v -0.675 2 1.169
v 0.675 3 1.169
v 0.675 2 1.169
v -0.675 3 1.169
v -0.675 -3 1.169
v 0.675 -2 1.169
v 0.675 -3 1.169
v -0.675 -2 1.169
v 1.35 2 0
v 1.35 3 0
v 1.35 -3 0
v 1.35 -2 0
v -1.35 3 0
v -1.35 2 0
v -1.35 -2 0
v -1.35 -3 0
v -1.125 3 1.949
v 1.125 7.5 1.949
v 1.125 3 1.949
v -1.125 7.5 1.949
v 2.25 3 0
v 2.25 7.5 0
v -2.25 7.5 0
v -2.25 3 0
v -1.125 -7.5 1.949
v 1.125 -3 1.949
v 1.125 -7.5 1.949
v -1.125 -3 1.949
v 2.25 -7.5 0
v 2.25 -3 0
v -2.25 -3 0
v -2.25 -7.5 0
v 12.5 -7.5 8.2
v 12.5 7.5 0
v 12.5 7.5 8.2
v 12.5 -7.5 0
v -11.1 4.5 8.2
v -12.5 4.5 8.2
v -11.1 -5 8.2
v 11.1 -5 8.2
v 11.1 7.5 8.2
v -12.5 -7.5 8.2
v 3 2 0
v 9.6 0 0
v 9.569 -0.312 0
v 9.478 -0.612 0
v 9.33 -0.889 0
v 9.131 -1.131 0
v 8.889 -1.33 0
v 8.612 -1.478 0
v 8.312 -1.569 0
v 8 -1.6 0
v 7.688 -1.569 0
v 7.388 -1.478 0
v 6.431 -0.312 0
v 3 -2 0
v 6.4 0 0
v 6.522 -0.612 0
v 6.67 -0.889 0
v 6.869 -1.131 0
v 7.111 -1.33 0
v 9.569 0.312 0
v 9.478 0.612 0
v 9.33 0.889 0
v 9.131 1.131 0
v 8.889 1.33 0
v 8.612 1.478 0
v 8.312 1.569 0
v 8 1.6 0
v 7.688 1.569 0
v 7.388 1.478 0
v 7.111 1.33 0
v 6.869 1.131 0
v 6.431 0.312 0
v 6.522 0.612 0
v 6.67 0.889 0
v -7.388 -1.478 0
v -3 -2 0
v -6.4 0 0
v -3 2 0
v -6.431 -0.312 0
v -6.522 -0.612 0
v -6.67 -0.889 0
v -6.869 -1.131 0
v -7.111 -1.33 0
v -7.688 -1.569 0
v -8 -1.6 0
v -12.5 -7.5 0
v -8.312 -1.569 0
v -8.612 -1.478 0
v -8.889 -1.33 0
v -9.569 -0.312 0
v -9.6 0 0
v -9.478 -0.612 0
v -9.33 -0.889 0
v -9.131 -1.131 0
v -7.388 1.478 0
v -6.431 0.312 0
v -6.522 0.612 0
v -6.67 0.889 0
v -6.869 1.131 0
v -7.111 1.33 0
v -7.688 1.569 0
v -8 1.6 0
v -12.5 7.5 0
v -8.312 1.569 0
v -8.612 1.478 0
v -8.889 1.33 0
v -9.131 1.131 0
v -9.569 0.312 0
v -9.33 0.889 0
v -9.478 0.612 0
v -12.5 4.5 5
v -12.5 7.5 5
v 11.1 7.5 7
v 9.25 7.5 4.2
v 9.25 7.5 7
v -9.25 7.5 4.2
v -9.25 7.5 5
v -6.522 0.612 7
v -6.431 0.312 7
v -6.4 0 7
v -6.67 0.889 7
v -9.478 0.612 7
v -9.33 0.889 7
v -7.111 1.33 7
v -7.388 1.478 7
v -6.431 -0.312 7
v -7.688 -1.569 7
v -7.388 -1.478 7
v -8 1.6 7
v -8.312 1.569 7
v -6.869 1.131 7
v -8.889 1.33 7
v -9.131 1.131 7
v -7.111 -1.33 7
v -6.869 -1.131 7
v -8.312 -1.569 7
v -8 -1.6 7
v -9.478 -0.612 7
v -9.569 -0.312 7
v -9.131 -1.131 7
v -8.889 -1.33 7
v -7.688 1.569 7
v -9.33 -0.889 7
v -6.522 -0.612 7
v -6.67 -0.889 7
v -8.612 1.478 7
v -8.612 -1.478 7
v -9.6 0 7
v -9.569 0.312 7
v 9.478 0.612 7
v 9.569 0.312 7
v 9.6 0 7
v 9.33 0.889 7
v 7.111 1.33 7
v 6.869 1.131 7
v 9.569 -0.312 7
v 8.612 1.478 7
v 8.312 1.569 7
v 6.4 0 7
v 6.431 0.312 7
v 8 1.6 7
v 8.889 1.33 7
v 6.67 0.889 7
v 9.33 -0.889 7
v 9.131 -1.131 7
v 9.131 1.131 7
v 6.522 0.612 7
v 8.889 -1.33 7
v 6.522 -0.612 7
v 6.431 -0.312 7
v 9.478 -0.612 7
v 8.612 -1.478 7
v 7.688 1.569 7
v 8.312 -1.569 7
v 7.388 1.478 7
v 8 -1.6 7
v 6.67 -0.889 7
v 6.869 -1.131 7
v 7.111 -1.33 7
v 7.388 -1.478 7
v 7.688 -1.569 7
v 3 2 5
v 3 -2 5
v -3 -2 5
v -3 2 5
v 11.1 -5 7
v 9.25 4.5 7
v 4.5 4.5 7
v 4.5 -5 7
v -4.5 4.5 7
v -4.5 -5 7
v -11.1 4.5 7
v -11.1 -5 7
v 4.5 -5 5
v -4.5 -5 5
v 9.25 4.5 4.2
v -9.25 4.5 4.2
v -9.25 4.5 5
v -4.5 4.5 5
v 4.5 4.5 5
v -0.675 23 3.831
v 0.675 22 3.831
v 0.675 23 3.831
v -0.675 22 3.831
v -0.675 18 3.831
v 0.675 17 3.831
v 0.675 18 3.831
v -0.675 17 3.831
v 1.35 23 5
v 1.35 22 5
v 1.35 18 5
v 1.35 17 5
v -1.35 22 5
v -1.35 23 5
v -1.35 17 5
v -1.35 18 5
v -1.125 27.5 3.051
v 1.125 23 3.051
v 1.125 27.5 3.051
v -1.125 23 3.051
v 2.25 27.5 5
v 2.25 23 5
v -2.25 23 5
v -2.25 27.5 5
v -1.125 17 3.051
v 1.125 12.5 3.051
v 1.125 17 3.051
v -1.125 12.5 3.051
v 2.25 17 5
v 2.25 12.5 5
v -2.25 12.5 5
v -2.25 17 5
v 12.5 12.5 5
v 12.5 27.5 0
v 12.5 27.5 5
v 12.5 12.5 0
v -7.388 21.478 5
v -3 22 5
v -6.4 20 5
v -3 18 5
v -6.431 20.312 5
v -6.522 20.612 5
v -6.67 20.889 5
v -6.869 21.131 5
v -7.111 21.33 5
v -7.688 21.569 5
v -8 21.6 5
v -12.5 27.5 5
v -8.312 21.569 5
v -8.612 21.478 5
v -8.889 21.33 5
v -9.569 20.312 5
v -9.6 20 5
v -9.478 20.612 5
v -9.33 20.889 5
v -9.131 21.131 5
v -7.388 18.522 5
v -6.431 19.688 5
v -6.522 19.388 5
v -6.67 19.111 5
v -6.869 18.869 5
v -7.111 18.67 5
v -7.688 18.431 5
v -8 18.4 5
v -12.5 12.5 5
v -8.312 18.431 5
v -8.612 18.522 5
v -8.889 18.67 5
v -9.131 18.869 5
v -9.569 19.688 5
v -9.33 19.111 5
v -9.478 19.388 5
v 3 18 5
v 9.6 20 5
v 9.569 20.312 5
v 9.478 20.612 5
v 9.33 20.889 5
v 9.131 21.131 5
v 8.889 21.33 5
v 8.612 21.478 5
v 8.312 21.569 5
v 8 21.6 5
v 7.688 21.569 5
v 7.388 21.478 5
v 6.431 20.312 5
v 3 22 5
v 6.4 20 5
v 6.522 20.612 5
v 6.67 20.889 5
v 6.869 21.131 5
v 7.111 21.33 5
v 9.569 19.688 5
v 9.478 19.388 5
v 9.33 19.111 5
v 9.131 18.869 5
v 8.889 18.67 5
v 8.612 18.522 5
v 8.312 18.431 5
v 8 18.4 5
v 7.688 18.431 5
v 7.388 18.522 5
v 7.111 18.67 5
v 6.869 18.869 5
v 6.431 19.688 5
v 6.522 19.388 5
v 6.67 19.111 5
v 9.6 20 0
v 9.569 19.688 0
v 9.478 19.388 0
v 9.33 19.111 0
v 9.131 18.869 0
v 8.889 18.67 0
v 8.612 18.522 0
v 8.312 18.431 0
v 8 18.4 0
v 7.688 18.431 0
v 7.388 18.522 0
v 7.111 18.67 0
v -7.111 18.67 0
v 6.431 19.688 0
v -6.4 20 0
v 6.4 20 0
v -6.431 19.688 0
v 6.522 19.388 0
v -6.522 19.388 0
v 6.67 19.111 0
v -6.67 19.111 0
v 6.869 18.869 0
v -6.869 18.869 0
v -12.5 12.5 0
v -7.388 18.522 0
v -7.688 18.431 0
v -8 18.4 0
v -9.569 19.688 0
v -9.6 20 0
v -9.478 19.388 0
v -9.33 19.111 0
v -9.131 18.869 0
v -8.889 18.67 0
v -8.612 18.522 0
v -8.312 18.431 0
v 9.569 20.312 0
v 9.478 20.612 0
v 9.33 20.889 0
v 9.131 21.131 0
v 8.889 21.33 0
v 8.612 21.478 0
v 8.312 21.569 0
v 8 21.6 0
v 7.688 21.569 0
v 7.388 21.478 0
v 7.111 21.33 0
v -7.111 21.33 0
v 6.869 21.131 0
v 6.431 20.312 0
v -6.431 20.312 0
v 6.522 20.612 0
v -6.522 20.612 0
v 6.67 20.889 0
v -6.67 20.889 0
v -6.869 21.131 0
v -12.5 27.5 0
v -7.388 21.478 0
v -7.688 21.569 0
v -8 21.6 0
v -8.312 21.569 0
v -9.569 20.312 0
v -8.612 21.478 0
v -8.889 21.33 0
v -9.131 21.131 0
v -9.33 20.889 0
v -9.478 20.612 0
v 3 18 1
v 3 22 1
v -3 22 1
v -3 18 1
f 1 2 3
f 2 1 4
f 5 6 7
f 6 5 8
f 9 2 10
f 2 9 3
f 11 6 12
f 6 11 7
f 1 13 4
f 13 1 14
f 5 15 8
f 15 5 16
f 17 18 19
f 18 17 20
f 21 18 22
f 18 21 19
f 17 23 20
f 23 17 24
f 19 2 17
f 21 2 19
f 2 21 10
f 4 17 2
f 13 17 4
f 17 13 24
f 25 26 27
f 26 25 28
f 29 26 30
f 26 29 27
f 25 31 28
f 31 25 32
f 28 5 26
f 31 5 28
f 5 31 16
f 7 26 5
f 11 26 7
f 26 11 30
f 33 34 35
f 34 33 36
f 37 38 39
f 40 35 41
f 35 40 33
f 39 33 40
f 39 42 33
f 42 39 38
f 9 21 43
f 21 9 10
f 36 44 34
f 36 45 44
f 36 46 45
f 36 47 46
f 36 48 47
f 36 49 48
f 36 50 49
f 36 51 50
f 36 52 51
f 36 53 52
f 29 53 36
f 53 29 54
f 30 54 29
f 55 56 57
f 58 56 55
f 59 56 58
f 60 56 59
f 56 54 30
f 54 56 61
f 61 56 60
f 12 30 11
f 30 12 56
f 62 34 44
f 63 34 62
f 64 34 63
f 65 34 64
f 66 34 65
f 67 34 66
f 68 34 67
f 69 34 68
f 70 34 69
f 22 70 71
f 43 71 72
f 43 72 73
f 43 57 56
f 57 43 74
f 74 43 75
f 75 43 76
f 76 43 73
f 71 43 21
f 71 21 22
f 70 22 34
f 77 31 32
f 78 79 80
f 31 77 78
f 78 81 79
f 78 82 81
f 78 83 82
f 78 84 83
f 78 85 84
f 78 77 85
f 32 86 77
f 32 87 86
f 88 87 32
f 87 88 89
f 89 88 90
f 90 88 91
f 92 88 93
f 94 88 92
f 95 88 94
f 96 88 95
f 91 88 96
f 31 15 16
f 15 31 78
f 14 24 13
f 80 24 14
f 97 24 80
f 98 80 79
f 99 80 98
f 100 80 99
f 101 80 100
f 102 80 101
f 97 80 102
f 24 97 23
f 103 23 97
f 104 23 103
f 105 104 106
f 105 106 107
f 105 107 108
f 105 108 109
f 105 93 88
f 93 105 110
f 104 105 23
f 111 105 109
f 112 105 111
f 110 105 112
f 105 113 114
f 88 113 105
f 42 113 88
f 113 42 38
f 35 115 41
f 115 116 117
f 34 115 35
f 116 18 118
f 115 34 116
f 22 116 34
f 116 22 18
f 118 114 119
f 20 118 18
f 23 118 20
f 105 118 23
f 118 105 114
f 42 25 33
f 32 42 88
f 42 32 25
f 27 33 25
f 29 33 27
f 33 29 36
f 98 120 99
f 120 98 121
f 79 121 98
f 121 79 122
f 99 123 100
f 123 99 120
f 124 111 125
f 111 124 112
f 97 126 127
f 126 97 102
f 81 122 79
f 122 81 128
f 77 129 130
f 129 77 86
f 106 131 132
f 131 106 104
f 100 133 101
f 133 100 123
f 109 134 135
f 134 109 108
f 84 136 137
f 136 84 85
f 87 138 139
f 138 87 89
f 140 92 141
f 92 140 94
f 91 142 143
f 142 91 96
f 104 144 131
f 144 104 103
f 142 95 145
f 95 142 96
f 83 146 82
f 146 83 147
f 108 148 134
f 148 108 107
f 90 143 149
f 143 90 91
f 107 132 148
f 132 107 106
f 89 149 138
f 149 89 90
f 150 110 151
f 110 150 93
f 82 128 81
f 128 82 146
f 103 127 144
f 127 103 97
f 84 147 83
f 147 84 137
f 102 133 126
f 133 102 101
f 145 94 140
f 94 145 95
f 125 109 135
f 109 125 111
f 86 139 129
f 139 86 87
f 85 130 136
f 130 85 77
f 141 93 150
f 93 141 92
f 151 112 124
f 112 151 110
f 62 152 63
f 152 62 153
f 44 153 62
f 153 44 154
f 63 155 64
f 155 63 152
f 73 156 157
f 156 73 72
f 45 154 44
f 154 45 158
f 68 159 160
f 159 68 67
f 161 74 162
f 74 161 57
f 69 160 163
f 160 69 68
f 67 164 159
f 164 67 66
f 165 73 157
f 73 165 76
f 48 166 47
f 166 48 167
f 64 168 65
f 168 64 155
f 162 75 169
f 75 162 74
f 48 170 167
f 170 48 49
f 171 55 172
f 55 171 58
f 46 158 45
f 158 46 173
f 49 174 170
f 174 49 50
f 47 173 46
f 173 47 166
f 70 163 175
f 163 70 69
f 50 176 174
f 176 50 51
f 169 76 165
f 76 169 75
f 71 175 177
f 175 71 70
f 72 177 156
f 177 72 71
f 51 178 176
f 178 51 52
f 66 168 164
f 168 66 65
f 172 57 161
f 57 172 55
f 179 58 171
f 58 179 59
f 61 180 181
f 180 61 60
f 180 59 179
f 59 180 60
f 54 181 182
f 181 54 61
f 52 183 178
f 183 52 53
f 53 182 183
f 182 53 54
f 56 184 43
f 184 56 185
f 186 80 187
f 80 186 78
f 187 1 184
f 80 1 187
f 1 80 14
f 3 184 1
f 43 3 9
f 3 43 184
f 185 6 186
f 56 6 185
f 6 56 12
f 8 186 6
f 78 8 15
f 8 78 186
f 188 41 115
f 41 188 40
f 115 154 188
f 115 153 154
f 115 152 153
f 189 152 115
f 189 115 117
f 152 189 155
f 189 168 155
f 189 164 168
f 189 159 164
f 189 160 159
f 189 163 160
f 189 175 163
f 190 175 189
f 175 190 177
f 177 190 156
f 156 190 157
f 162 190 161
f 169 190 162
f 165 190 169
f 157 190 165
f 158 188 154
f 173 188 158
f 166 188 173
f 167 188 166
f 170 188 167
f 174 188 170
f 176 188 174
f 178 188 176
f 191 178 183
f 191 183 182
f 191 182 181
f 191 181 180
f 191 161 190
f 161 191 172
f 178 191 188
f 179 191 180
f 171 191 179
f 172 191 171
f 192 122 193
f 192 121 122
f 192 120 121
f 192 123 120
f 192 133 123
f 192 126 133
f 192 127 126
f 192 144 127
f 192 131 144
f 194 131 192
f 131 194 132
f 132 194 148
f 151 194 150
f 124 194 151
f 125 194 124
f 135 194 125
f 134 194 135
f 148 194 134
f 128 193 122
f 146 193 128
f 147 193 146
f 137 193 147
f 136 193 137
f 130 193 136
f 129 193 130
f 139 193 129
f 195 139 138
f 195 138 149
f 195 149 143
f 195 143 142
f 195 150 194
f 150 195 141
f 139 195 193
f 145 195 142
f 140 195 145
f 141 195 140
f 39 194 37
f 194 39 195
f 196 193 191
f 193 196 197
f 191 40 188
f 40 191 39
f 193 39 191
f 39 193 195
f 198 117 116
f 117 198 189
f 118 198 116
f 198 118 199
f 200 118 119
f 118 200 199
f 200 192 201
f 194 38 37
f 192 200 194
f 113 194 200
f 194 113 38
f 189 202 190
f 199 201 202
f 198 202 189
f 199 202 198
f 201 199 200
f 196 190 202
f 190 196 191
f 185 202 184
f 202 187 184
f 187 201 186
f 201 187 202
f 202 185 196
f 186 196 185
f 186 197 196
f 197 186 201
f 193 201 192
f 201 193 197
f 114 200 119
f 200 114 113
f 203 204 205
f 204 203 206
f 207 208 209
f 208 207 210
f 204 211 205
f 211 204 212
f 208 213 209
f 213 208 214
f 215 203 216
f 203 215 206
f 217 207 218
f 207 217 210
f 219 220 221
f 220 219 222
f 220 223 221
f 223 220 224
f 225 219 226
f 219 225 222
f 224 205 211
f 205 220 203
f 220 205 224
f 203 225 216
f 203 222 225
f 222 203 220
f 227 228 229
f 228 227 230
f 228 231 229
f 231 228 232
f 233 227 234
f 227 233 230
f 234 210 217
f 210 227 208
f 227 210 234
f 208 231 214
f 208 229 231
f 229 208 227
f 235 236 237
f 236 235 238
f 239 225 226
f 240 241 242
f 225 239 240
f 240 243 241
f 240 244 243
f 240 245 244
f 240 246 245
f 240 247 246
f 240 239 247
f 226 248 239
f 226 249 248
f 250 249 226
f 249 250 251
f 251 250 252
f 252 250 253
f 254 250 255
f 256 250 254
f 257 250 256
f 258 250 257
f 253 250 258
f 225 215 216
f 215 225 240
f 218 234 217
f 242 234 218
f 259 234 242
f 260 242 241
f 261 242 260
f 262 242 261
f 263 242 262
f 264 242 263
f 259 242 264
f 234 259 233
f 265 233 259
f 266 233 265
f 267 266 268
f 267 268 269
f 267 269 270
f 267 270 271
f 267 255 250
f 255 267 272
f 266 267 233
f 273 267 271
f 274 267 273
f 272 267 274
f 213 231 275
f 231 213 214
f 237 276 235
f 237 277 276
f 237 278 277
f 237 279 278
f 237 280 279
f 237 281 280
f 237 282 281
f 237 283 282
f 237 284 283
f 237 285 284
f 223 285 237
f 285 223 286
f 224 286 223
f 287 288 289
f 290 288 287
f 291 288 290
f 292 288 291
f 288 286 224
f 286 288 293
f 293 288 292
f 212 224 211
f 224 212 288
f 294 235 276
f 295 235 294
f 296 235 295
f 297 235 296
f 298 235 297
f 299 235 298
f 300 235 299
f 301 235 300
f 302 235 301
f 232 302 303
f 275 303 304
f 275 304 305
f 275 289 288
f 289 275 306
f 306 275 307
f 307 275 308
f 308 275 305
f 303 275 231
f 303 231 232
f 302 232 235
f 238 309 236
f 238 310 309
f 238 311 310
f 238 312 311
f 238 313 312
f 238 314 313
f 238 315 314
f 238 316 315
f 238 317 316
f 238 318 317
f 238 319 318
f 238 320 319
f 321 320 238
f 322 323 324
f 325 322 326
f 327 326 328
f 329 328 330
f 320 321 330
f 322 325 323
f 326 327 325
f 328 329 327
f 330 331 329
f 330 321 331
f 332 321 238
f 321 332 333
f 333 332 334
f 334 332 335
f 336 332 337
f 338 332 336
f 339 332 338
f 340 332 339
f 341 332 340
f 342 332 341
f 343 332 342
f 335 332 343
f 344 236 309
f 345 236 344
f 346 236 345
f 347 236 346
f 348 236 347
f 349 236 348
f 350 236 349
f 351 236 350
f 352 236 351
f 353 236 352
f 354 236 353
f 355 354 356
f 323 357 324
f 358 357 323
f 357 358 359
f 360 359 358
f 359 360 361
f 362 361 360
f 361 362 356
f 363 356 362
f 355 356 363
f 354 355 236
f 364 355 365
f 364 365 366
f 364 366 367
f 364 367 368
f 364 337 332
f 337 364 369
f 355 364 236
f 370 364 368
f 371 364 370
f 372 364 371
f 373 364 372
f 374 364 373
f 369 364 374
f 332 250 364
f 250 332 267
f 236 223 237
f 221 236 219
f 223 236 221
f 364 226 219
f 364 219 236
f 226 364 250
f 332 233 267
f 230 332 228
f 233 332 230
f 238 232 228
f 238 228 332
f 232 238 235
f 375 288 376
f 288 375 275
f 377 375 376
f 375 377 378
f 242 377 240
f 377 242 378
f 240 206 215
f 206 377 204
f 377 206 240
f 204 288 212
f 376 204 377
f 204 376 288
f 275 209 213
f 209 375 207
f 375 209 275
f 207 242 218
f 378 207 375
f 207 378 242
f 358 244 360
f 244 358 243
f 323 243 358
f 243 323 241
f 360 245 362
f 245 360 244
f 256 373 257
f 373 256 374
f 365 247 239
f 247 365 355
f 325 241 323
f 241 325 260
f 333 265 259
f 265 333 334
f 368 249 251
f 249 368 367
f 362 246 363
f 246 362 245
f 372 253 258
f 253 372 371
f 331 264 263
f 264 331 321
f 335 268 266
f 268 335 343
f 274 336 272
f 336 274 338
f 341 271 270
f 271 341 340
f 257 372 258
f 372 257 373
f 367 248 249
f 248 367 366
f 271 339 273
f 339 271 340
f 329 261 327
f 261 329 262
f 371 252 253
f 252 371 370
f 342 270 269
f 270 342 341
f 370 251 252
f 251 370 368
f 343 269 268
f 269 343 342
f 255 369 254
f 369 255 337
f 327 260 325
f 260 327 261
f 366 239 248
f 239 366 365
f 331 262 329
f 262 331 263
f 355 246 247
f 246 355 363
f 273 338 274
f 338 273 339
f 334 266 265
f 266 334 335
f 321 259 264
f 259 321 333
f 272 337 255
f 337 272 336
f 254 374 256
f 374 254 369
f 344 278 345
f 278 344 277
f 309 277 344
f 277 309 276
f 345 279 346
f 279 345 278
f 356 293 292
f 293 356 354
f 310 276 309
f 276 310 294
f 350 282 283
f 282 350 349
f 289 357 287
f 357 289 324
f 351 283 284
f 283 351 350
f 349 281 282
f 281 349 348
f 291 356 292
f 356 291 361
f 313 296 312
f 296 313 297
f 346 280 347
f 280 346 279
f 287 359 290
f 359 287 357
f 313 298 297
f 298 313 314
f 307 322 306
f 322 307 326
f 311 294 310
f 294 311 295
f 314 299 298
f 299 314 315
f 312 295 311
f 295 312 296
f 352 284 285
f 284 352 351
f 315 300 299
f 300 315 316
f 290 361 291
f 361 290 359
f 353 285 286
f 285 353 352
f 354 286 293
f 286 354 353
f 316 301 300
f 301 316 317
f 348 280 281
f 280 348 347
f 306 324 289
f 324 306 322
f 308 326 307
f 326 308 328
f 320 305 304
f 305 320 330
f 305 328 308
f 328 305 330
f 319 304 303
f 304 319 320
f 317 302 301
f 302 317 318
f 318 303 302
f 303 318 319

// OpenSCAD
/* [Hidden] */
// Duet3D laser filament sensor housing by D. Crocker, Escher 3D

/* [Options] */

// Select height of the filament centre above the PCB
filamentHeight=7;				// [4:0.2:9]

// Select the nominal diameter of the cutout for the PTFE tube. This needs to be somewhat larger than the outside diameter of the tube, but small enough to grip the tube when the two pieces are fastened together.
tubeDiameter=4.5;				// [4.0:0.1:5.2]

// Select the nominal diameter of the holes in the tube end stops for the filament to pass through. This needs to be somewhat larger than the outside diameter of the filament to prevent it rubbing, but smaller than the outside diameter of the tubing.
innerDiameter=2.7;				// [2.0:0.1:4.2]

// Do you want the top to be open or closed?
closedTop = 1;					// [0:Open,1:Closed]

/* [Hidden] */

width=25;
depth=15;
holeSpacing=16;

boardWidth=22.2;					// added 0.2mm clearance
boardComponentsWidth1=18.5;
boardComponentsWidth2=9;
boardComponentsHeight1=2.8;		// the deepest parts are the connector spills
boardComponentsHeight2=2.0;		// the deepest parts are the connector spills

holeInsetDepth1=5;
holeInsetDepth2=4.5;
boardDepth=9.5;
boardThickness=1.2;
stopThickness=1.0;

topHeight=4;
innerTubeDiameter=2.5;
chipDepth=4;
chipWidth=6;
M3clear=3.2;
M3head=7.5;

overlap=0.1;

module cubeXY(x,y,z) {
	translate([-x/2, -y/2, 0]) cube([x,y,z]);
}

module cubeX(x,y,z) {
	translate([-x/2, 0, 0]) cube([x,y,z]);
}

module FilamentGroove() {
	translate([0, -depth/2-overlap, 0]) rotate([-90,0,0]) cylinder(r=innerDiameter/2,h=99,$fn=6);
	translate([0, chipDepth/2+stopThickness, 0]) rotate([-90,0,0]) cylinder(r=tubeDiameter/2,h=99,$fn=6);
	translate([0, -chipDepth/2-stopThickness, 0]) rotate([90,0,0]) cylinder(r=tubeDiameter/2,h=99,$fn=6);
}

module Base(thickness) {
	difference() {
		cubeXY(width,depth,thickness+boardThickness);
		translate([-holeSpacing/2,0,-overlap]) cylinder(r=M3clear/2, h=99, $fn=32);
		translate([holeSpacing/2,0,-overlap]) cylinder(r=M3clear/2, h=99, $fn=32);
		FilamentGroove();
		translate([0,0,-overlap]) cubeXY(chipWidth, chipDepth, thickness+2*overlap);
		translate([0,-holeInsetDepth1, thickness]) cubeX(boardWidth,depth, boardThickness+overlap);
		translate([0,+holeInsetDepth2, thickness-boardComponentsHeight1])
			cubeX(boardComponentsWidth1, depth, boardComponentsHeight1+overlap);
		translate([0,-holeInsetDepth1, thickness-boardComponentsHeight2])
			cubeX(boardComponentsWidth2, depth, boardComponentsHeight2+overlap);
		translate([-20,holeInsetDepth2,thickness-boardComponentsHeight2]) cube([20,5,10]);
	}
}

module Top(thickness, isClosed) {
	difference() {
		cubeXY(width,depth,(isClosed) ? thickness + 1 : thickness);
		translate([0,0,(isClosed) ? 1 : -overlap]) cubeXY(chipWidth, chipDepth, thickness+2*overlap);
		translate([-holeSpacing/2,0,-overlap]) cylinder(r=M3clear/2, h=99, $fn=32);
		translate([holeSpacing/2,0,-overlap]) cylinder(r=M3clear/2, h=99, $fn=32);
		translate([0,0,(isClosed) ? thickness + 1 : thickness]) FilamentGroove();
	}
}

Base(filamentHeight);
translate([0, 20, 0]) Top(topHeight, closedTop);
